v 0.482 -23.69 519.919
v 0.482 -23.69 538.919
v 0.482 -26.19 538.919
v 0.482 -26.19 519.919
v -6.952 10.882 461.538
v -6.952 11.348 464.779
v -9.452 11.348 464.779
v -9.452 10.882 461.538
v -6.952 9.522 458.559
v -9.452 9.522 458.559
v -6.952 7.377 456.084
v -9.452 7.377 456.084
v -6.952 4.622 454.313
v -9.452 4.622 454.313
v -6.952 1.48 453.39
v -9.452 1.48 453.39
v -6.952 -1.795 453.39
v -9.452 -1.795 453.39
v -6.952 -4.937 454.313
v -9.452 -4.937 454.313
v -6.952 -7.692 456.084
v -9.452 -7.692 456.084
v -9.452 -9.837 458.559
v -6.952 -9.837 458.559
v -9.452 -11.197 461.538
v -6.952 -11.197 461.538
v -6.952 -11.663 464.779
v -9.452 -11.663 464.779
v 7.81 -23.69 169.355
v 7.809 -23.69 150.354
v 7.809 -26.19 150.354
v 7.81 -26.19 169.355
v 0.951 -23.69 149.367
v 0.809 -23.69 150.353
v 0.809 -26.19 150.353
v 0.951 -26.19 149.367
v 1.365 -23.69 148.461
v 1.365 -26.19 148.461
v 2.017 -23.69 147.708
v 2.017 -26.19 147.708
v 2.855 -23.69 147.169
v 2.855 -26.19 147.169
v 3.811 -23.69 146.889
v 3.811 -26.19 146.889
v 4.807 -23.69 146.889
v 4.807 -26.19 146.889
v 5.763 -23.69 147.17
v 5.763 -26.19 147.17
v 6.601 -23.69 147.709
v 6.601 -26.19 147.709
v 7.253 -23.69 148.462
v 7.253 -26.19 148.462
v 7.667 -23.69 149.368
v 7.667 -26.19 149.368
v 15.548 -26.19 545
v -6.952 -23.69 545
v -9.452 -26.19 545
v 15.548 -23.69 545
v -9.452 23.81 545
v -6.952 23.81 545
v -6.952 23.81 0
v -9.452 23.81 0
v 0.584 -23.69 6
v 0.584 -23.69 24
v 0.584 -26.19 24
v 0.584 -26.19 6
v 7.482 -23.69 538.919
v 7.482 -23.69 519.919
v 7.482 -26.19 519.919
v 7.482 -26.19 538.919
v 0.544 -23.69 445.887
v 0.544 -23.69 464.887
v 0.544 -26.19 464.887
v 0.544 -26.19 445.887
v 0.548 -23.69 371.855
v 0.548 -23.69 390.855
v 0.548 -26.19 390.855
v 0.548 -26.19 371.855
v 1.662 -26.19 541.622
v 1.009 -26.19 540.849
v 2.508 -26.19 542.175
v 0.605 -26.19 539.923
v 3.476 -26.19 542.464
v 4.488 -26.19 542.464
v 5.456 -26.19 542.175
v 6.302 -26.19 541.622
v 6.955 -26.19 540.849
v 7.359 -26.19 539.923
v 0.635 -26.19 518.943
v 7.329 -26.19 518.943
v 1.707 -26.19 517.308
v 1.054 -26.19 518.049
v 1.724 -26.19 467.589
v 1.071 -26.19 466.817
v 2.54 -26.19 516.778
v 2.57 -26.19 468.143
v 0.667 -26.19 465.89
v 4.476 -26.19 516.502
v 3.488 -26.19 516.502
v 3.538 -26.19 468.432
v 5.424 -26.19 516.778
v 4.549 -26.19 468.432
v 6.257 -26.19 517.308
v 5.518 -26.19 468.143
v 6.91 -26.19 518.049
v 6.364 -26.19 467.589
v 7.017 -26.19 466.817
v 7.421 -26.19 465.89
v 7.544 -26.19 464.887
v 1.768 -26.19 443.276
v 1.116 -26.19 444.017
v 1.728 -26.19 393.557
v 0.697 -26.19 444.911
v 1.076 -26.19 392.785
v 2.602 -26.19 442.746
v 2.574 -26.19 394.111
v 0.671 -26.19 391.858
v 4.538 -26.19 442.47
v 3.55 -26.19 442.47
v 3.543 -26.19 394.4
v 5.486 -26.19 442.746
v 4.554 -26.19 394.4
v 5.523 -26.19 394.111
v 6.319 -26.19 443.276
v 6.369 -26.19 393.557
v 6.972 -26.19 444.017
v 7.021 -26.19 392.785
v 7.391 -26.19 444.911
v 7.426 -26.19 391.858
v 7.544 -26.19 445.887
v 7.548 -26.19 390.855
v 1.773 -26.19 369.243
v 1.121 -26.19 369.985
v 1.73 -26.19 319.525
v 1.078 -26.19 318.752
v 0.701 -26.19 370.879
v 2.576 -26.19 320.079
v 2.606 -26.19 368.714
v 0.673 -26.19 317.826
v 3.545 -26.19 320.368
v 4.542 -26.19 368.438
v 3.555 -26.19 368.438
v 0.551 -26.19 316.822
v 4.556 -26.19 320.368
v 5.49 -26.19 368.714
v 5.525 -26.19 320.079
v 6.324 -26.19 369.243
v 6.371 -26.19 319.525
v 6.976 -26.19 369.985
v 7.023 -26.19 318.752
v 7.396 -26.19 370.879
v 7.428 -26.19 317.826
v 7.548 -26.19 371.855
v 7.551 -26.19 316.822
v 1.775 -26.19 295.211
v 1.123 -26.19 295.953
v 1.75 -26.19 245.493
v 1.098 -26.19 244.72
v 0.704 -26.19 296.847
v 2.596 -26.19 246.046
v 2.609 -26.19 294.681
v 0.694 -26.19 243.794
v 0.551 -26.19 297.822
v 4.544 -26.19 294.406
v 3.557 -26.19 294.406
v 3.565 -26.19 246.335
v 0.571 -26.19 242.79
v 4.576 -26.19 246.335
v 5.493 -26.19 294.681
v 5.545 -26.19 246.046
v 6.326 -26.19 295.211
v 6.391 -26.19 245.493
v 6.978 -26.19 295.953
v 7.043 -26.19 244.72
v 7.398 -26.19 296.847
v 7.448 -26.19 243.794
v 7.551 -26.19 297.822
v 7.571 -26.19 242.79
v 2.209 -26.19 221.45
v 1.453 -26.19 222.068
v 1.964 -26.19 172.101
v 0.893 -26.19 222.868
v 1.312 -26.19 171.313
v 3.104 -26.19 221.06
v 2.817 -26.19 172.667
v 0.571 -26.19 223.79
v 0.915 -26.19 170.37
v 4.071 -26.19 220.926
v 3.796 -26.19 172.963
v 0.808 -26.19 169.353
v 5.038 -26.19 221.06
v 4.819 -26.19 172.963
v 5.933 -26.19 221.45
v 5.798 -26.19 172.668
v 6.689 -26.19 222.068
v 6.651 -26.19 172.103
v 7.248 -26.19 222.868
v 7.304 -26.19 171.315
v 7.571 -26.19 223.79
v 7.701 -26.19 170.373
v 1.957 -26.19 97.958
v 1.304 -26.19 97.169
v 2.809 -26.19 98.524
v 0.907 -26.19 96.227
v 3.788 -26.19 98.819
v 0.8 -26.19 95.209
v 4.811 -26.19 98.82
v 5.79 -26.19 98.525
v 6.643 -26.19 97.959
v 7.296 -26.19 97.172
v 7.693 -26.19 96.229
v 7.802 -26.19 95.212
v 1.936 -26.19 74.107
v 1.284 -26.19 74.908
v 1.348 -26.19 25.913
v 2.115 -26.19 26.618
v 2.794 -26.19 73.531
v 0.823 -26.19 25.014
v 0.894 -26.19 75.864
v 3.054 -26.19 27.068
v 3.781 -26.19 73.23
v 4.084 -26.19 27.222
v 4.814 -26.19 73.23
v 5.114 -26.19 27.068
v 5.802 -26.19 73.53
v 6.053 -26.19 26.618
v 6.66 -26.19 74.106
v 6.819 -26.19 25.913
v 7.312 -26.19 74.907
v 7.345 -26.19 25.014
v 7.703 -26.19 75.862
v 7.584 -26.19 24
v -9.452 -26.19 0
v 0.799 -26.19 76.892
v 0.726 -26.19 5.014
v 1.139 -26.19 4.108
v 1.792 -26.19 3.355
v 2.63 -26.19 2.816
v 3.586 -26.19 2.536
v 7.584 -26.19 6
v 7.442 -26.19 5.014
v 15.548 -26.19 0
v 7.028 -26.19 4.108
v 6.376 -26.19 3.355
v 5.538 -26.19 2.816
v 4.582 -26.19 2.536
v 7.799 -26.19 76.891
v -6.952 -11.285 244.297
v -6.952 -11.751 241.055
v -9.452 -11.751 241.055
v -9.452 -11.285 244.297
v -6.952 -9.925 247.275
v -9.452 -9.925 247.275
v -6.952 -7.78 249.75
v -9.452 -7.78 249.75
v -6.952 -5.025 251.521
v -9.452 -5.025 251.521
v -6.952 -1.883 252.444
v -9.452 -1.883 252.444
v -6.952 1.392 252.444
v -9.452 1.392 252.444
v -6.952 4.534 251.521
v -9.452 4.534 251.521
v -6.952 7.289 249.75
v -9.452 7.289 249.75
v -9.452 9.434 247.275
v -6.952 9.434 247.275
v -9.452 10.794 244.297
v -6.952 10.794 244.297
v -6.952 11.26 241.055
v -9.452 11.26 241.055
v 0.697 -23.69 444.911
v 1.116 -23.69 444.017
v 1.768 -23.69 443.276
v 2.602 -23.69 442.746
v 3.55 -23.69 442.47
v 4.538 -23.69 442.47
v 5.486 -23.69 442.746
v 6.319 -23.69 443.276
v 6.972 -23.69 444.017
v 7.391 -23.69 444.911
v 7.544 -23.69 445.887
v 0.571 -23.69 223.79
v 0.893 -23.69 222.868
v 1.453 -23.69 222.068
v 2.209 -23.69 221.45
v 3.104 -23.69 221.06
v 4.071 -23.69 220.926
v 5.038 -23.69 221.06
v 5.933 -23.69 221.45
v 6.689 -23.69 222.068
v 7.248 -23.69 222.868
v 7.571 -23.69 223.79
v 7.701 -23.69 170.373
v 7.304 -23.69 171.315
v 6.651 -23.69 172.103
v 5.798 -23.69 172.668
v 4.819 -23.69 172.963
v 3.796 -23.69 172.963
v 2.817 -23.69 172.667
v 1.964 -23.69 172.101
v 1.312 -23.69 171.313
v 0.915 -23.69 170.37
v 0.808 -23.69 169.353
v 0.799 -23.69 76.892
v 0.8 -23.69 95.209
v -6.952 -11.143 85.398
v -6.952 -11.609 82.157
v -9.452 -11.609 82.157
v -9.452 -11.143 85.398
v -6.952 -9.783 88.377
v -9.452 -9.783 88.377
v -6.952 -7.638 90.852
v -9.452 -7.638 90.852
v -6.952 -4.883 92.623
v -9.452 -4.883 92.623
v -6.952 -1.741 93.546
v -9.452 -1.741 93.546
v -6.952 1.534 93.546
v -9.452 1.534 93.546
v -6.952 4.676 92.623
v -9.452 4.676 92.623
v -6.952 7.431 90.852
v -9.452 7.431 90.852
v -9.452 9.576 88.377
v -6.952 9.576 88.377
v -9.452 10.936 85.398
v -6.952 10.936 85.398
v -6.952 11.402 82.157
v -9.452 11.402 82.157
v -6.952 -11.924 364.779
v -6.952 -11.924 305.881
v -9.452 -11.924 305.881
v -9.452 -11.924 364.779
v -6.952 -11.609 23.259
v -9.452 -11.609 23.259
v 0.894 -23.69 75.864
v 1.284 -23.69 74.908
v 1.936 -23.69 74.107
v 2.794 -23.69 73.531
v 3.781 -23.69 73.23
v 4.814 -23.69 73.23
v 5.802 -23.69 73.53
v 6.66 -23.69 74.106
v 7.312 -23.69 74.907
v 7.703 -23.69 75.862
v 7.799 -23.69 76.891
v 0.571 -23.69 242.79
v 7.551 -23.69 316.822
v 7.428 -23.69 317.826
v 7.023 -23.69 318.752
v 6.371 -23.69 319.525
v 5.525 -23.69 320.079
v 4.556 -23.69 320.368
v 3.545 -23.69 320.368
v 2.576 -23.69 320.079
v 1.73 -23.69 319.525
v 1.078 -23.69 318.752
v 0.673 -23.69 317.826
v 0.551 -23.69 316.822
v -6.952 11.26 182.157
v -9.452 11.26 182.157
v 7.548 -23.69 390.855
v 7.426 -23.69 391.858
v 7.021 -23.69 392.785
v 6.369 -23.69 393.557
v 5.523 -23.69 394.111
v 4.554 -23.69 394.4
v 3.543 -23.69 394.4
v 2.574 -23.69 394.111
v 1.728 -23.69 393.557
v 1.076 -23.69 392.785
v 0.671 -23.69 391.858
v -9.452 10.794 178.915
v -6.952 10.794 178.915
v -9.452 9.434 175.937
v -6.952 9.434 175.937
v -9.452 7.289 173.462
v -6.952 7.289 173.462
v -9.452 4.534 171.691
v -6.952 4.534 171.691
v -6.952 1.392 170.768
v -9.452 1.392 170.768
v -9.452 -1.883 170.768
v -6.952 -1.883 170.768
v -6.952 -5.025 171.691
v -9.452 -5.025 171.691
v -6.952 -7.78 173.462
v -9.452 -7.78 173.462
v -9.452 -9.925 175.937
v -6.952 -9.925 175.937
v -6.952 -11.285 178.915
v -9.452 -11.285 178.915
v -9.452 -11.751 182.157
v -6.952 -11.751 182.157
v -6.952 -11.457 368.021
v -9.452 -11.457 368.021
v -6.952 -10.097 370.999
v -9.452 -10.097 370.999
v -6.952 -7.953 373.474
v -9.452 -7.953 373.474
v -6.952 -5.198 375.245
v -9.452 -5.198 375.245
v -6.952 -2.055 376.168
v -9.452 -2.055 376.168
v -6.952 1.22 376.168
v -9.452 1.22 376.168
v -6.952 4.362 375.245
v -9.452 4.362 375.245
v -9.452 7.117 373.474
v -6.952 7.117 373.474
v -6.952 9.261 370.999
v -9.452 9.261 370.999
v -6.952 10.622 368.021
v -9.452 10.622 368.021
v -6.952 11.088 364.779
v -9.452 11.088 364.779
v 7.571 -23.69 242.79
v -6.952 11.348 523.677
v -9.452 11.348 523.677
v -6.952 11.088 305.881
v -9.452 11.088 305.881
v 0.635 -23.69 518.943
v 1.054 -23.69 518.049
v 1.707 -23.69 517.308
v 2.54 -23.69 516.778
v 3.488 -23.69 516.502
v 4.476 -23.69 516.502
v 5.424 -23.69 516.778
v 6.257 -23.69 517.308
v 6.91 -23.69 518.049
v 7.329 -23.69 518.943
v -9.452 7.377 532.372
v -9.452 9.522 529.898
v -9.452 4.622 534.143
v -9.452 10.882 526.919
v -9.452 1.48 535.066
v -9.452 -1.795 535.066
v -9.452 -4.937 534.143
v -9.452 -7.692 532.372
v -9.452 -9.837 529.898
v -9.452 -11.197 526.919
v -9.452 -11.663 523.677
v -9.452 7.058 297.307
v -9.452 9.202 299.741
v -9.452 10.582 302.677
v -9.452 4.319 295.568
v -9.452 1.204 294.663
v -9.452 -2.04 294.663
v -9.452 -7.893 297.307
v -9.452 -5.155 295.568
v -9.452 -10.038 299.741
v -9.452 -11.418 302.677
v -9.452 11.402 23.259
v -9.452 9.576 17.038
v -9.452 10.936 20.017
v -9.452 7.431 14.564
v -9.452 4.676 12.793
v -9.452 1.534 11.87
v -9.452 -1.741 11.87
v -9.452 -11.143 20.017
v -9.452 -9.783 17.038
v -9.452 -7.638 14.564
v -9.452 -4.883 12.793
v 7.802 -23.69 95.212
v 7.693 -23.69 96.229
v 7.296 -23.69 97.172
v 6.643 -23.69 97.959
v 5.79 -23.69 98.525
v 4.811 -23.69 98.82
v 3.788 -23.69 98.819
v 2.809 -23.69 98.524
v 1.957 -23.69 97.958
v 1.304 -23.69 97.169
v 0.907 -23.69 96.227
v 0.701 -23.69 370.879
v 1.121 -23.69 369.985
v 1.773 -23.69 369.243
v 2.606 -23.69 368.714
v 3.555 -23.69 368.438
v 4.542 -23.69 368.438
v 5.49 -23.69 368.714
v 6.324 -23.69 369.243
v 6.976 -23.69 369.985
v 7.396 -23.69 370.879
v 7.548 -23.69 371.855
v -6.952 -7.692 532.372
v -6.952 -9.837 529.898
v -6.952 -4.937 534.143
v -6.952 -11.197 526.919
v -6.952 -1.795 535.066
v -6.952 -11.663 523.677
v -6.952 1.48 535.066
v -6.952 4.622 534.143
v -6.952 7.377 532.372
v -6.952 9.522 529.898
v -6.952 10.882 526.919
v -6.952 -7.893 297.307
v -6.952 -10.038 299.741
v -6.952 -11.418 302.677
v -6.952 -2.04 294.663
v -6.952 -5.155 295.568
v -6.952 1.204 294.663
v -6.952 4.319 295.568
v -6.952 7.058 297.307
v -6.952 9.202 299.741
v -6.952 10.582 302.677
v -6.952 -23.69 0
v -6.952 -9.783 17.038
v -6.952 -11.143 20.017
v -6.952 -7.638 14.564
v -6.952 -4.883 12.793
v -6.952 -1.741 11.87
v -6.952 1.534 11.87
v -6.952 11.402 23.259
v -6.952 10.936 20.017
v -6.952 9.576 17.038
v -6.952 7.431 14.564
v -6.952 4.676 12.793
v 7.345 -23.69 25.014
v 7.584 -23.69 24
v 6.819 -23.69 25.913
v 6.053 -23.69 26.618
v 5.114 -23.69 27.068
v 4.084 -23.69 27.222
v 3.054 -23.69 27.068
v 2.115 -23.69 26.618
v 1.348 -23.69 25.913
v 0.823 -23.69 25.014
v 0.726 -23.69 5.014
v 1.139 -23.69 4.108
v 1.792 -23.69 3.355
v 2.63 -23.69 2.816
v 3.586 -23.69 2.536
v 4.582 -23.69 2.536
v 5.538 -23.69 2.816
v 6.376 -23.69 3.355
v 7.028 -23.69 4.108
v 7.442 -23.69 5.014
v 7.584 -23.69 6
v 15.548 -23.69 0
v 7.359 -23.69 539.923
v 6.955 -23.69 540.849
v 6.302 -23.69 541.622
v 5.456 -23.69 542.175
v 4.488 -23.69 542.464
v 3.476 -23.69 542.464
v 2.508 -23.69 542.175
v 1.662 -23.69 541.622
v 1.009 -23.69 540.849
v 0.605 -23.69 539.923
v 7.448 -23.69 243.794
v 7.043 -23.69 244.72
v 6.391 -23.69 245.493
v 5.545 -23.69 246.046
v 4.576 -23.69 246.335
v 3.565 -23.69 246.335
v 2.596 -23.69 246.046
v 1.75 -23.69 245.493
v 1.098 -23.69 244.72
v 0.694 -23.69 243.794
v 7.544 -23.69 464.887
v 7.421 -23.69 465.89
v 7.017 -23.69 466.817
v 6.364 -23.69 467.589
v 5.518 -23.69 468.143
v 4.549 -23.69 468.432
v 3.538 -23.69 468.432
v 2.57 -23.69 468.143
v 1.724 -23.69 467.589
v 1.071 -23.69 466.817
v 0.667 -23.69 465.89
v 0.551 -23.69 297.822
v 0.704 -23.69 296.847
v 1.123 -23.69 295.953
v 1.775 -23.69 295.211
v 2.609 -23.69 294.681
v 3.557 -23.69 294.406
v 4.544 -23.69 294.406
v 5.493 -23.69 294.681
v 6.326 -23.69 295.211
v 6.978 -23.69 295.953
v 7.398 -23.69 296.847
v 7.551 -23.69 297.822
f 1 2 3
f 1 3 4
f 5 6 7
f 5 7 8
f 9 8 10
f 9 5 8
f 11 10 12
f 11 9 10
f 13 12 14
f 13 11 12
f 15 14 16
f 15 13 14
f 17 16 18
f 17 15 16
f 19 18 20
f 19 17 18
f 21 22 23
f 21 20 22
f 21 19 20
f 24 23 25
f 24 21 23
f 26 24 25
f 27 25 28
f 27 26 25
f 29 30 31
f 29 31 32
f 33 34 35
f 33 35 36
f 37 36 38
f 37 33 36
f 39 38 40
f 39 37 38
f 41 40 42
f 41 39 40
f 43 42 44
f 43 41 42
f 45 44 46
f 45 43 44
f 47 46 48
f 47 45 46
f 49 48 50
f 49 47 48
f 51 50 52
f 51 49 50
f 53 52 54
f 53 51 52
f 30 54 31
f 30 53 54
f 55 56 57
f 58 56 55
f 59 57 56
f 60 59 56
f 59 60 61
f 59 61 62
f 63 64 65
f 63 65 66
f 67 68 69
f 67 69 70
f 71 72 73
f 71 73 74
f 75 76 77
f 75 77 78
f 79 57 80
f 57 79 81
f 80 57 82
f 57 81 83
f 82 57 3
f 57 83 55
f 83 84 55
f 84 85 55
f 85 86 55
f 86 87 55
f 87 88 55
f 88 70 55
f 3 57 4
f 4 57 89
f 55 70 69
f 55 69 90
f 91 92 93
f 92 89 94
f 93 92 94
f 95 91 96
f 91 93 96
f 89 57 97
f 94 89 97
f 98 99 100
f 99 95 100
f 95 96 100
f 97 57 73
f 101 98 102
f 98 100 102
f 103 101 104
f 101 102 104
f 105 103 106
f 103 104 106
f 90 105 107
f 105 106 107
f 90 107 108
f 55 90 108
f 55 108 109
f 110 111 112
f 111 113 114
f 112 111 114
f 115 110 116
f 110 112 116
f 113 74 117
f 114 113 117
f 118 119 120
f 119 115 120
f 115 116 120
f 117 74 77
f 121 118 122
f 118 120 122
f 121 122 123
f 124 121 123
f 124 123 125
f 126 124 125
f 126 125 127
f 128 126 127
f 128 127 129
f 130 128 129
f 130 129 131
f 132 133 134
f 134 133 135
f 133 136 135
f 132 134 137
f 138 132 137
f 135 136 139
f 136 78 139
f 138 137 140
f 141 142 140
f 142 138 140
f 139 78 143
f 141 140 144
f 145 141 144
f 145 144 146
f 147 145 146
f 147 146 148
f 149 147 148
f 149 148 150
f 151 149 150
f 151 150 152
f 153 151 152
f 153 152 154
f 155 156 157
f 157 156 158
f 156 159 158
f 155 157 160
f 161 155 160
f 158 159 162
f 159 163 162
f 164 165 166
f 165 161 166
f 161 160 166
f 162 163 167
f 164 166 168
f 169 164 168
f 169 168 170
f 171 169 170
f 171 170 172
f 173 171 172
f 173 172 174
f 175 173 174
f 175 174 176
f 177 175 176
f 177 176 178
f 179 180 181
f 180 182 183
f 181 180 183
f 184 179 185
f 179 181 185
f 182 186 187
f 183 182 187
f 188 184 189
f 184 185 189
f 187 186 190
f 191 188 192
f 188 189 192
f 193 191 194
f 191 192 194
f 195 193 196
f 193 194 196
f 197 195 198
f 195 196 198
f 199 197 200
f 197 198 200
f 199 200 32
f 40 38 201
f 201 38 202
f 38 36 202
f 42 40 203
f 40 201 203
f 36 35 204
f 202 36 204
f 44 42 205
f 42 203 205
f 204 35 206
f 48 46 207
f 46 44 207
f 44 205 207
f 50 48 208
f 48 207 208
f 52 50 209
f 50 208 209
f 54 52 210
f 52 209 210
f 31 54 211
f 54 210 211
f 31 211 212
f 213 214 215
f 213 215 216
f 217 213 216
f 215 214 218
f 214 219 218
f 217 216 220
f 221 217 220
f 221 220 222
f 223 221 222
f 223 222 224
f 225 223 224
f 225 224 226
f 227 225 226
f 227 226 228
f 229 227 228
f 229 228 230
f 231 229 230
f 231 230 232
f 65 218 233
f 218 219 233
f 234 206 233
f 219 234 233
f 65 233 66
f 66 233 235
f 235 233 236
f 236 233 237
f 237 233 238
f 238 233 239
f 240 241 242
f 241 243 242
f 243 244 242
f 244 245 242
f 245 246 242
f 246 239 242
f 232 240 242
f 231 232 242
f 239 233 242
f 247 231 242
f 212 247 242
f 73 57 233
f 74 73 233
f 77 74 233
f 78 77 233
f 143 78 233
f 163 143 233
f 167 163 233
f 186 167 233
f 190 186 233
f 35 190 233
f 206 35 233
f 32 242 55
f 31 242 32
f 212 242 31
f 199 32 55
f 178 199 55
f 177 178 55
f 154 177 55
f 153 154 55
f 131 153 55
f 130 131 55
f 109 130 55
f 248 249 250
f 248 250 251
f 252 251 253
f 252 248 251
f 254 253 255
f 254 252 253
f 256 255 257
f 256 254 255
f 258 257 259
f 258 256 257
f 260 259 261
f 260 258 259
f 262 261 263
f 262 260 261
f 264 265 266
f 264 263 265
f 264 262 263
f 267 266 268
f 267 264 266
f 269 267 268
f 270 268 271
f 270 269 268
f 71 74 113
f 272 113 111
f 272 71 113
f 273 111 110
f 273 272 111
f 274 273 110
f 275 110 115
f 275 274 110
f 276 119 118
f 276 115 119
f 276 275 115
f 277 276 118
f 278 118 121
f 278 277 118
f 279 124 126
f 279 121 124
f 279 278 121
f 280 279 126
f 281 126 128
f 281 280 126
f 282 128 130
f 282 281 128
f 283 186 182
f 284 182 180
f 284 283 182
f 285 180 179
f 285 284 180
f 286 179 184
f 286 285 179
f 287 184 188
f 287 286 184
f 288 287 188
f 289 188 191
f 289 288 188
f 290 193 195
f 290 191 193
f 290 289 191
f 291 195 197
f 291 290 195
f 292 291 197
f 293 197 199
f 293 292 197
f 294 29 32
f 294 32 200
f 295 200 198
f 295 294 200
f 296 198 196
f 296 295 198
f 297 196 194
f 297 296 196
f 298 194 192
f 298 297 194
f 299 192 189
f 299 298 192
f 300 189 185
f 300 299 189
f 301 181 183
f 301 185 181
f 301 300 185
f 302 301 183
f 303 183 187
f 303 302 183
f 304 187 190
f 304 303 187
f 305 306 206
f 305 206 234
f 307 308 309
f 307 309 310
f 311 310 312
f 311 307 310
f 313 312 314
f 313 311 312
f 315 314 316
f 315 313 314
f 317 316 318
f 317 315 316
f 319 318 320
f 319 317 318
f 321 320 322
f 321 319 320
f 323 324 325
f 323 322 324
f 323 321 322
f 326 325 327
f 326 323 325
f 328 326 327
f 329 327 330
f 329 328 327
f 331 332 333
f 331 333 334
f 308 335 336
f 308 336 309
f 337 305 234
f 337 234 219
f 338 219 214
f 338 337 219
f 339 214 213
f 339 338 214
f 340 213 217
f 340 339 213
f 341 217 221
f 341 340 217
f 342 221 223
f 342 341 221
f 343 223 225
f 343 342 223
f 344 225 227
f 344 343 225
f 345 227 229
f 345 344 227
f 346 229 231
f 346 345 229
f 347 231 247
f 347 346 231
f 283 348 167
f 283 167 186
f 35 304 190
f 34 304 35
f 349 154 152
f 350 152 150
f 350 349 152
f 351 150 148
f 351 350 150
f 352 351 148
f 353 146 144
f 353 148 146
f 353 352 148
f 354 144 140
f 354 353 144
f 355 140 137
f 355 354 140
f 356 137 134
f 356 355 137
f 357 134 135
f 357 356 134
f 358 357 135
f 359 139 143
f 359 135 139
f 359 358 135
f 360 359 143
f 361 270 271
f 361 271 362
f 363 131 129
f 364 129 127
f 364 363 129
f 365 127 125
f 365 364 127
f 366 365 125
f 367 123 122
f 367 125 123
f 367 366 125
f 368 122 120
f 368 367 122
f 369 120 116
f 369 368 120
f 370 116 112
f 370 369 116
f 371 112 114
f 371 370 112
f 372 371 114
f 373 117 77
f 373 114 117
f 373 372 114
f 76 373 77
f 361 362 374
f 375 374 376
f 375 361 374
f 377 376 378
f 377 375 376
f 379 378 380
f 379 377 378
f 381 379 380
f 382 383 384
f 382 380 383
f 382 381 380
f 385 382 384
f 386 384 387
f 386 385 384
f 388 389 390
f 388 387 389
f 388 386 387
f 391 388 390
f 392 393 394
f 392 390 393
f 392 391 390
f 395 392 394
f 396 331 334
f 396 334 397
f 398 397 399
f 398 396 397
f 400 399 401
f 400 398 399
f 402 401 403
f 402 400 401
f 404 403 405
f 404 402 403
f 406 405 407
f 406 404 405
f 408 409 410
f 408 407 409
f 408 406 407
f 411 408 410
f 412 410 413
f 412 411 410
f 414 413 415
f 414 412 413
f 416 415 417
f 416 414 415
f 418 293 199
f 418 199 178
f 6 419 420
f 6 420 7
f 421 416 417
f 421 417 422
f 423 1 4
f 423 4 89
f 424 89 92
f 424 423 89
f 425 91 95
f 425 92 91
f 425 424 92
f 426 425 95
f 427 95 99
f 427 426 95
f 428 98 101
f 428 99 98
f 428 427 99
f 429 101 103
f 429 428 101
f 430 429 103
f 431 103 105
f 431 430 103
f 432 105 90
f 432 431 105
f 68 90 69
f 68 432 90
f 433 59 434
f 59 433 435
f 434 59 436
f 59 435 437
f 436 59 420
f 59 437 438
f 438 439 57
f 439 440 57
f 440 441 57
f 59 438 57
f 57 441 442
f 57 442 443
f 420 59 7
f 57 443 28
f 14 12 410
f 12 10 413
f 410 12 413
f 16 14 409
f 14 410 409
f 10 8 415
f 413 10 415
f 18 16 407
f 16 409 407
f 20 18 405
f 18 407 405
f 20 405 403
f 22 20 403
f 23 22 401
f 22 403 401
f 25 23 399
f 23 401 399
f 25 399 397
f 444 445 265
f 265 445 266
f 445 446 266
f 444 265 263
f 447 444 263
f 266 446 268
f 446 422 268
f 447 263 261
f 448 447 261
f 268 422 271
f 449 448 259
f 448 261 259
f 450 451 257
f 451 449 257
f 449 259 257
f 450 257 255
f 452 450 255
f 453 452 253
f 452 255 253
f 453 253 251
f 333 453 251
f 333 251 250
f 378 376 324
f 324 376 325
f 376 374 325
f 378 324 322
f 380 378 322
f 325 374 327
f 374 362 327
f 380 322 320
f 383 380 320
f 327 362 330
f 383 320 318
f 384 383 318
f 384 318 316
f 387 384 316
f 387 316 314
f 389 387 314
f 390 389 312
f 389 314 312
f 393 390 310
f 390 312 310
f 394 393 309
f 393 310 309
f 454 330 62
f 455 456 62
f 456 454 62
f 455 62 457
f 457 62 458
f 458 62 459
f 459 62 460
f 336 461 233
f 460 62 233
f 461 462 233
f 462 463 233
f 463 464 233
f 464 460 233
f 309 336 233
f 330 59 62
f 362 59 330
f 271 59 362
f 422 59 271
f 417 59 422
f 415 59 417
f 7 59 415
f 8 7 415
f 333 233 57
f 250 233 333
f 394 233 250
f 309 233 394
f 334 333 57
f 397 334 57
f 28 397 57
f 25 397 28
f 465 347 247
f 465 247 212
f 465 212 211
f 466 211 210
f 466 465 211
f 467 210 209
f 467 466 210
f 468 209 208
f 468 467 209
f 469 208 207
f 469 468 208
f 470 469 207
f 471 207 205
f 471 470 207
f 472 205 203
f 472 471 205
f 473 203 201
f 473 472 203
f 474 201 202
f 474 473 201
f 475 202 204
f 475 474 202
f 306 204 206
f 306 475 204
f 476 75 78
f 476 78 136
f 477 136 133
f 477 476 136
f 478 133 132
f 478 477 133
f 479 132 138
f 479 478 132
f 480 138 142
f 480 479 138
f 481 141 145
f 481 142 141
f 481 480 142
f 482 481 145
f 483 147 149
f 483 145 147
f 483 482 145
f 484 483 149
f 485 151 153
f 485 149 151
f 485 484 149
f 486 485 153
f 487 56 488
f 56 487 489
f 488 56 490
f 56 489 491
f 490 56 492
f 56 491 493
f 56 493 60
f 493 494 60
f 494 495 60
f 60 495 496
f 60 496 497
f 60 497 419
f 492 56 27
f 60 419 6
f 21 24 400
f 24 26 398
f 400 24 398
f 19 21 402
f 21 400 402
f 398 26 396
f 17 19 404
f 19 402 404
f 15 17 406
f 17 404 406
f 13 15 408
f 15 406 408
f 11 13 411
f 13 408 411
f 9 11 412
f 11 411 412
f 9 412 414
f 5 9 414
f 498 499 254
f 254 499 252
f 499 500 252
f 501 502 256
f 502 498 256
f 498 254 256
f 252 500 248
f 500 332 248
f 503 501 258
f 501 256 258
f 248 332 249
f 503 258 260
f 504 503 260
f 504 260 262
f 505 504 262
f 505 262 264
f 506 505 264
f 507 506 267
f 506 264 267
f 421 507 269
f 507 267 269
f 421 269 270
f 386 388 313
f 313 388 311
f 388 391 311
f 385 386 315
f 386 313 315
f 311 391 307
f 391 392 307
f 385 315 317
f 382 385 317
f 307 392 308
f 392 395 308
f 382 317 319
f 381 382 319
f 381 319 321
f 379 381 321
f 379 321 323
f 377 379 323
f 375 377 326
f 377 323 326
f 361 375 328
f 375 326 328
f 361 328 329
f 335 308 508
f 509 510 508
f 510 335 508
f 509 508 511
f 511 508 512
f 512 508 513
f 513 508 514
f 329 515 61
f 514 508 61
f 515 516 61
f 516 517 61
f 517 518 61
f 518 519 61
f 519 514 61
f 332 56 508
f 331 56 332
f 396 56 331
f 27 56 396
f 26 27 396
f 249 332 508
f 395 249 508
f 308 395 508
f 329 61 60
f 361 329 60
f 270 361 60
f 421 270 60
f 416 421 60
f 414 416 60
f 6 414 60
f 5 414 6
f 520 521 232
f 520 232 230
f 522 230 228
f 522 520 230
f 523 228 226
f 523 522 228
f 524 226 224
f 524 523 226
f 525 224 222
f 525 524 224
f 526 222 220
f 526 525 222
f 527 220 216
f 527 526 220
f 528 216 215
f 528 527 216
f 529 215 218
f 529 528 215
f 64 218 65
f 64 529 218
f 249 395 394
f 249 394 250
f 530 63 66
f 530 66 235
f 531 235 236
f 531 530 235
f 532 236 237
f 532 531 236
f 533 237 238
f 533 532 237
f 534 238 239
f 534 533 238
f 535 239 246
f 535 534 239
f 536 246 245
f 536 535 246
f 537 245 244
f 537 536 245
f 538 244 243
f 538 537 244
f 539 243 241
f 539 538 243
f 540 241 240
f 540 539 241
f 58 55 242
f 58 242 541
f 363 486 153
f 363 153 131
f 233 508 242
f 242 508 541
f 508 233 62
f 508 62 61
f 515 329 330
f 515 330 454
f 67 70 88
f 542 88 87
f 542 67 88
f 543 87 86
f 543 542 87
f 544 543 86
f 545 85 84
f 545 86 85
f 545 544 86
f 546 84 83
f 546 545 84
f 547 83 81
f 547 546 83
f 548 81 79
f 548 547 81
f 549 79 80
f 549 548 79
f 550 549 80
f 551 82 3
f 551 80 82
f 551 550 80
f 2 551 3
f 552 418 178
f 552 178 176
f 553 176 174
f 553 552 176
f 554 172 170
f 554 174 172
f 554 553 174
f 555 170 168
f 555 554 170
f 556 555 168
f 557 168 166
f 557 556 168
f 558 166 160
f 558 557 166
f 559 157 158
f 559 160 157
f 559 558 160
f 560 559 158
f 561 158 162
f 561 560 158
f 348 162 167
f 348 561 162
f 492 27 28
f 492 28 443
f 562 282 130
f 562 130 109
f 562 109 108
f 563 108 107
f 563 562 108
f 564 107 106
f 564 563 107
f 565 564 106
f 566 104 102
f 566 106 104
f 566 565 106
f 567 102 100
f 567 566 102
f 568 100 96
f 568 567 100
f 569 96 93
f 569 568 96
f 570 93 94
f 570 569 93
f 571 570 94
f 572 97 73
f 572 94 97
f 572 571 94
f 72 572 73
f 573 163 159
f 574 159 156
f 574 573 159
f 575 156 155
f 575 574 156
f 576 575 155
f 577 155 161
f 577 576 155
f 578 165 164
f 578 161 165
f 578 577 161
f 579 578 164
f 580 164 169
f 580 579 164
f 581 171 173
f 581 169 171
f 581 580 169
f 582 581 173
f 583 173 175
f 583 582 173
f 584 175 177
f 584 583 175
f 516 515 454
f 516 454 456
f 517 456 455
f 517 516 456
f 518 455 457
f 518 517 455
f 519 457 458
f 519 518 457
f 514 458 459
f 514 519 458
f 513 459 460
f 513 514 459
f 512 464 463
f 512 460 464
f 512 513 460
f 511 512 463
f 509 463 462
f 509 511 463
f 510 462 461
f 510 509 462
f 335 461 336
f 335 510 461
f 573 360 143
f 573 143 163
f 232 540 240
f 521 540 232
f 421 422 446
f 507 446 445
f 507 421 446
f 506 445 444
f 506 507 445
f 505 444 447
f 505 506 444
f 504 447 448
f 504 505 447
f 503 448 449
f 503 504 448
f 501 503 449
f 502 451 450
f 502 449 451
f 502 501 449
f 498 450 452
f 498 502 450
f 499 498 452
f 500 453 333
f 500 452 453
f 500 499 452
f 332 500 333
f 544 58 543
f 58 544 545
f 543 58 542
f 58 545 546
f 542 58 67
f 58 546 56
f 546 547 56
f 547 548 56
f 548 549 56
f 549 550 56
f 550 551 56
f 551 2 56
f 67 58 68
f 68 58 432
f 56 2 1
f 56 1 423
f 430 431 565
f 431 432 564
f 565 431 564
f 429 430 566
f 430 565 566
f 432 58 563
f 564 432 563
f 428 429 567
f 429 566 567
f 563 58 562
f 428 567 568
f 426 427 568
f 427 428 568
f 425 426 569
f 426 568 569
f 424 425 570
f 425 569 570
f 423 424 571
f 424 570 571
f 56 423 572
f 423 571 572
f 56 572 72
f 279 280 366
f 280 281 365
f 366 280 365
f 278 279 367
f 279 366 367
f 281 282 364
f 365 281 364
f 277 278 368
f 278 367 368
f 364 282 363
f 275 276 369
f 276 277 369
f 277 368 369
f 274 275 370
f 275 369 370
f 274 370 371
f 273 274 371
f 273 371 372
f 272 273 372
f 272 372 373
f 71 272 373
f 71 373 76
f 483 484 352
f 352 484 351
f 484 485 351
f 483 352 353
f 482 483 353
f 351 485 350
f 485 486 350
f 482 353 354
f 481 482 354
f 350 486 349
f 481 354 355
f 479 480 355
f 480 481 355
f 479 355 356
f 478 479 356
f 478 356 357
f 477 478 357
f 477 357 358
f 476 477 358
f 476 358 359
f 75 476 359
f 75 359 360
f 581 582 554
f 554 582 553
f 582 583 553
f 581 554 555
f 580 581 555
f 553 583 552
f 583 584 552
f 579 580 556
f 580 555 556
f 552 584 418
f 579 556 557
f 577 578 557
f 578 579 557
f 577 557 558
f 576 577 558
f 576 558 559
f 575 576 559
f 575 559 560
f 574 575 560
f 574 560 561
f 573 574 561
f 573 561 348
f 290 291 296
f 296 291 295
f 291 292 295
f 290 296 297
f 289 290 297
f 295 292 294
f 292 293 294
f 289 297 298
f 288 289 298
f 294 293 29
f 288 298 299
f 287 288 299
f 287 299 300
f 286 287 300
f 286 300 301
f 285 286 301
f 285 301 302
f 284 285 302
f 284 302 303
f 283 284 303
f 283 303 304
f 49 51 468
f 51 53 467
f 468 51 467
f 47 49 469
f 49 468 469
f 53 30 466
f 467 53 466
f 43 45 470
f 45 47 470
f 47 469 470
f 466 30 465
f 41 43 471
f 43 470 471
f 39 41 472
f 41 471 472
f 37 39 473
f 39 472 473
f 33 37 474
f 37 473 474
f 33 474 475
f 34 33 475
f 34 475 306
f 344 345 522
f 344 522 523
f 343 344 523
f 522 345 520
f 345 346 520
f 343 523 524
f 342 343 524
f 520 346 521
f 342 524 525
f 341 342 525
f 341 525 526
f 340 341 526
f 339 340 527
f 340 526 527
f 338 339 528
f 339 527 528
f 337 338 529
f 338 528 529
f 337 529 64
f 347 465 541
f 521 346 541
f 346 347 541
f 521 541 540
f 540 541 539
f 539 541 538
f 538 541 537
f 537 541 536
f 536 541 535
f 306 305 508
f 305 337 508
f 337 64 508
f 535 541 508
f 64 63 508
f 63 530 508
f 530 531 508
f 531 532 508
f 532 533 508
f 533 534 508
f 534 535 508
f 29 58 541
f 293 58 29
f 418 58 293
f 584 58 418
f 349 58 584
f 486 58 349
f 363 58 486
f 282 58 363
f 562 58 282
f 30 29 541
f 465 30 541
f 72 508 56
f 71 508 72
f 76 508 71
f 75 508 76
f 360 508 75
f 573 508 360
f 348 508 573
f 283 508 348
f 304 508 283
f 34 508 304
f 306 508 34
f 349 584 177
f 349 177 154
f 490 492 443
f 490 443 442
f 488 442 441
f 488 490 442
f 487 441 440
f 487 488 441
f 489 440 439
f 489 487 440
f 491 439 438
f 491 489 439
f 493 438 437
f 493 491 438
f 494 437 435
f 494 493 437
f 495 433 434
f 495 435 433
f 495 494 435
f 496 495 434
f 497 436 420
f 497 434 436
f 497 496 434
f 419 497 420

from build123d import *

# Parameters (mm, degrees)
BOSS_EXTRUDE1_DEPTH = 545
CUT_EXTRUDE2_DEPTH  = 10
CUT_EXTRUDE3_DEPTH  = 10


with BuildPart() as part:
    # Sketch1 → Boss-Extrude1 (new body)
    with BuildSketch(Plane.XY):
        Polygon((-9.451520251, 23.80952381), (-9.451520251, -26.19047619), (15.548479749, -26.19047619), (15.548479749, -23.69047619), (-6.951520251, -23.69047619), (-6.951520251, 23.80952381), align=None)
    extrude(amount=BOSS_EXTRUDE1_DEPTH)

    # Sketch3 → Cut-Extrude2 (cut)
    with BuildSketch(Plane(origin=(0, -23.69047619, 0), x_dir=(1, 0, 0), z_dir=(0, 1, 0))):
        with BuildLine():
            Line((0.57076558, -242.790014276), (0.57076558, -223.790014276))
            ThreePointArc((0.57076558, -223.790014276), (4.07076558, -220.926188945), (7.57076558, -223.790014276))
            Line((7.57076558, -223.790014276), (7.57076558, -242.790014276))
            ThreePointArc((7.57076558, -242.790014276), (4.07076558, -246.37195288), (0.57076558, -242.790014276))
        make_face()
        with BuildLine():
            Line((0.807679204, -169.35276274), (0.808591774, -150.352762761))
            ThreePointArc((0.808591774, -150.352762761), (4.309142051, -146.853313591), (7.808591221, -150.353863868))
            Line((7.808591221, -150.353863868), (7.809609956, -169.355340241))
            ThreePointArc((7.809609956, -169.355340241), (4.307302192, -173.000725763), (0.807679204, -169.35276274))
        make_face()
        with BuildLine():
            Line((0.583868221, -24), (0.583868221, -6))
            ThreePointArc((0.583868221, -6), (4.083868221, -2.5), (7.583868221, -6))
            Line((7.583868221, -6), (7.583868221, -24))
            ThreePointArc((7.583868221, -24), (4.083868221, -27.222249808), (0.583868221, -24))
        make_face()
        with BuildLine():
            Line((0.55068367, -316.822260412), (0.55068367, -297.822260412))
            ThreePointArc((0.55068367, -297.822260412), (4.05068367, -294.370676122), (7.55068367, -297.822260412))
            Line((7.55068367, -297.822260412), (7.55068367, -316.822260412))
            ThreePointArc((7.55068367, -316.822260412), (4.05068367, -320.404199017), (0.55068367, -316.822260412))
        make_face()
        with BuildLine():
            Line((0.548436659, -390.854506502), (0.548436659, -371.854506502))
            ThreePointArc((0.548436659, -371.854506502), (4.048436659, -368.402922212), (7.548436659, -371.854506502))
            Line((7.548436659, -371.854506502), (7.548436659, -390.854506502))
            ThreePointArc((7.548436659, -390.854506502), (4.048436659, -394.436445107), (0.548436659, -390.854506502))
        make_face()
        with BuildLine():
            Line((0.543910271, -464.886752452), (0.543910271, -445.886752452))
            ThreePointArc((0.543910271, -445.886752452), (4.043910271, -442.435168162), (7.543910271, -445.886752452))
            Line((7.543910271, -445.886752452), (7.543910271, -464.886752452))
            ThreePointArc((7.543910271, -464.886752452), (4.043910271, -468.468691057), (0.543910271, -464.886752452))
        make_face()
        with BuildLine():
            Line((0.482021973, -538.918998588), (0.482021973, -519.918998588))
            ThreePointArc((0.482021973, -519.918998588), (3.982021973, -516.467414298), (7.482021973, -519.918998588))
            Line((7.482021973, -519.918998588), (7.482021973, -538.918998588))
            ThreePointArc((7.482021973, -538.918998588), (3.982021973, -542.500937193), (0.482021973, -538.918998588))
        make_face()
        with BuildLine():
            Line((0.799787986, -95.209226687), (0.798633115, -76.892344291))
            ThreePointArc((0.798633115, -76.892344291), (4.297807626, -73.191635658), (7.798672507, -76.890745244))
            Line((7.798672507, -76.890745244), (7.801718738, -95.211804188))
            ThreePointArc((7.801718738, -95.211804188), (4.299410974, -98.857189711), (0.799787986, -95.209226687))
        make_face()
    extrude(amount=-CUT_EXTRUDE2_DEPTH, mode=Mode.SUBTRACT)

    # Sketch2 → Cut-Extrude3 (cut)
    with BuildSketch(Plane(origin=(-6.951520251, 0, 0), x_dir=(0, 0, -1), z_dir=(1, 0, 0))):
        with BuildLine():
            Line((-523.677073705, 11.34825395), (-464.779022926, 11.34825395))
            ThreePointArc((-464.779022926, 11.34825395), (-453.273357193, -0.157411783), (-464.779022926, -11.663077517))
            Line((-464.779022926, -11.663077517), (-523.677073705, -11.663077517))
            ThreePointArc((-523.677073705, -11.663077517), (-535.182739439, -0.157411783), (-523.677073705, 11.34825395))
        make_face()
        with BuildLine():
            Line((-364.779022926, 11.087774361), (-305.880972148, 11.087774361))
            ThreePointArc((-305.880972148, 11.087774361), (-294.548021848, -0.417891372), (-305.880972148, -11.923557106))
            Line((-305.880972148, -11.923557106), (-364.779022926, -11.923557106))
            ThreePointArc((-364.779022926, -11.923557106), (-376.28468866, -0.417891372), (-364.779022926, 11.087774361))
        make_face()
        with BuildLine():
            Line((-241.055003683, 11.260273997), (-182.156952904, 11.260273997))
            ThreePointArc((-182.156952904, 11.260273997), (-170.65128717, -0.245391736), (-182.156952904, -11.75105747))
            Line((-182.156952904, -11.75105747), (-241.055003683, -11.75105747))
            ThreePointArc((-241.055003683, -11.75105747), (-252.560669416, -0.245391736), (-241.055003683, 11.260273997))
        make_face()
        with BuildLine():
            Line((-82.156952904, 11.402162448), (-23.258902125, 11.402162448))
            ThreePointArc((-23.258902125, 11.402162448), (-11.753236392, -0.103503285), (-23.258902125, -11.609169019))
            Line((-23.258902125, -11.609169019), (-82.156952904, -11.609169019))
            ThreePointArc((-82.156952904, -11.609169019), (-93.662618637, -0.103503285), (-82.156952904, 11.402162448))
        make_face()
    extrude(amount=-CUT_EXTRUDE3_DEPTH, mode=Mode.SUBTRACT)


solid = part.part
